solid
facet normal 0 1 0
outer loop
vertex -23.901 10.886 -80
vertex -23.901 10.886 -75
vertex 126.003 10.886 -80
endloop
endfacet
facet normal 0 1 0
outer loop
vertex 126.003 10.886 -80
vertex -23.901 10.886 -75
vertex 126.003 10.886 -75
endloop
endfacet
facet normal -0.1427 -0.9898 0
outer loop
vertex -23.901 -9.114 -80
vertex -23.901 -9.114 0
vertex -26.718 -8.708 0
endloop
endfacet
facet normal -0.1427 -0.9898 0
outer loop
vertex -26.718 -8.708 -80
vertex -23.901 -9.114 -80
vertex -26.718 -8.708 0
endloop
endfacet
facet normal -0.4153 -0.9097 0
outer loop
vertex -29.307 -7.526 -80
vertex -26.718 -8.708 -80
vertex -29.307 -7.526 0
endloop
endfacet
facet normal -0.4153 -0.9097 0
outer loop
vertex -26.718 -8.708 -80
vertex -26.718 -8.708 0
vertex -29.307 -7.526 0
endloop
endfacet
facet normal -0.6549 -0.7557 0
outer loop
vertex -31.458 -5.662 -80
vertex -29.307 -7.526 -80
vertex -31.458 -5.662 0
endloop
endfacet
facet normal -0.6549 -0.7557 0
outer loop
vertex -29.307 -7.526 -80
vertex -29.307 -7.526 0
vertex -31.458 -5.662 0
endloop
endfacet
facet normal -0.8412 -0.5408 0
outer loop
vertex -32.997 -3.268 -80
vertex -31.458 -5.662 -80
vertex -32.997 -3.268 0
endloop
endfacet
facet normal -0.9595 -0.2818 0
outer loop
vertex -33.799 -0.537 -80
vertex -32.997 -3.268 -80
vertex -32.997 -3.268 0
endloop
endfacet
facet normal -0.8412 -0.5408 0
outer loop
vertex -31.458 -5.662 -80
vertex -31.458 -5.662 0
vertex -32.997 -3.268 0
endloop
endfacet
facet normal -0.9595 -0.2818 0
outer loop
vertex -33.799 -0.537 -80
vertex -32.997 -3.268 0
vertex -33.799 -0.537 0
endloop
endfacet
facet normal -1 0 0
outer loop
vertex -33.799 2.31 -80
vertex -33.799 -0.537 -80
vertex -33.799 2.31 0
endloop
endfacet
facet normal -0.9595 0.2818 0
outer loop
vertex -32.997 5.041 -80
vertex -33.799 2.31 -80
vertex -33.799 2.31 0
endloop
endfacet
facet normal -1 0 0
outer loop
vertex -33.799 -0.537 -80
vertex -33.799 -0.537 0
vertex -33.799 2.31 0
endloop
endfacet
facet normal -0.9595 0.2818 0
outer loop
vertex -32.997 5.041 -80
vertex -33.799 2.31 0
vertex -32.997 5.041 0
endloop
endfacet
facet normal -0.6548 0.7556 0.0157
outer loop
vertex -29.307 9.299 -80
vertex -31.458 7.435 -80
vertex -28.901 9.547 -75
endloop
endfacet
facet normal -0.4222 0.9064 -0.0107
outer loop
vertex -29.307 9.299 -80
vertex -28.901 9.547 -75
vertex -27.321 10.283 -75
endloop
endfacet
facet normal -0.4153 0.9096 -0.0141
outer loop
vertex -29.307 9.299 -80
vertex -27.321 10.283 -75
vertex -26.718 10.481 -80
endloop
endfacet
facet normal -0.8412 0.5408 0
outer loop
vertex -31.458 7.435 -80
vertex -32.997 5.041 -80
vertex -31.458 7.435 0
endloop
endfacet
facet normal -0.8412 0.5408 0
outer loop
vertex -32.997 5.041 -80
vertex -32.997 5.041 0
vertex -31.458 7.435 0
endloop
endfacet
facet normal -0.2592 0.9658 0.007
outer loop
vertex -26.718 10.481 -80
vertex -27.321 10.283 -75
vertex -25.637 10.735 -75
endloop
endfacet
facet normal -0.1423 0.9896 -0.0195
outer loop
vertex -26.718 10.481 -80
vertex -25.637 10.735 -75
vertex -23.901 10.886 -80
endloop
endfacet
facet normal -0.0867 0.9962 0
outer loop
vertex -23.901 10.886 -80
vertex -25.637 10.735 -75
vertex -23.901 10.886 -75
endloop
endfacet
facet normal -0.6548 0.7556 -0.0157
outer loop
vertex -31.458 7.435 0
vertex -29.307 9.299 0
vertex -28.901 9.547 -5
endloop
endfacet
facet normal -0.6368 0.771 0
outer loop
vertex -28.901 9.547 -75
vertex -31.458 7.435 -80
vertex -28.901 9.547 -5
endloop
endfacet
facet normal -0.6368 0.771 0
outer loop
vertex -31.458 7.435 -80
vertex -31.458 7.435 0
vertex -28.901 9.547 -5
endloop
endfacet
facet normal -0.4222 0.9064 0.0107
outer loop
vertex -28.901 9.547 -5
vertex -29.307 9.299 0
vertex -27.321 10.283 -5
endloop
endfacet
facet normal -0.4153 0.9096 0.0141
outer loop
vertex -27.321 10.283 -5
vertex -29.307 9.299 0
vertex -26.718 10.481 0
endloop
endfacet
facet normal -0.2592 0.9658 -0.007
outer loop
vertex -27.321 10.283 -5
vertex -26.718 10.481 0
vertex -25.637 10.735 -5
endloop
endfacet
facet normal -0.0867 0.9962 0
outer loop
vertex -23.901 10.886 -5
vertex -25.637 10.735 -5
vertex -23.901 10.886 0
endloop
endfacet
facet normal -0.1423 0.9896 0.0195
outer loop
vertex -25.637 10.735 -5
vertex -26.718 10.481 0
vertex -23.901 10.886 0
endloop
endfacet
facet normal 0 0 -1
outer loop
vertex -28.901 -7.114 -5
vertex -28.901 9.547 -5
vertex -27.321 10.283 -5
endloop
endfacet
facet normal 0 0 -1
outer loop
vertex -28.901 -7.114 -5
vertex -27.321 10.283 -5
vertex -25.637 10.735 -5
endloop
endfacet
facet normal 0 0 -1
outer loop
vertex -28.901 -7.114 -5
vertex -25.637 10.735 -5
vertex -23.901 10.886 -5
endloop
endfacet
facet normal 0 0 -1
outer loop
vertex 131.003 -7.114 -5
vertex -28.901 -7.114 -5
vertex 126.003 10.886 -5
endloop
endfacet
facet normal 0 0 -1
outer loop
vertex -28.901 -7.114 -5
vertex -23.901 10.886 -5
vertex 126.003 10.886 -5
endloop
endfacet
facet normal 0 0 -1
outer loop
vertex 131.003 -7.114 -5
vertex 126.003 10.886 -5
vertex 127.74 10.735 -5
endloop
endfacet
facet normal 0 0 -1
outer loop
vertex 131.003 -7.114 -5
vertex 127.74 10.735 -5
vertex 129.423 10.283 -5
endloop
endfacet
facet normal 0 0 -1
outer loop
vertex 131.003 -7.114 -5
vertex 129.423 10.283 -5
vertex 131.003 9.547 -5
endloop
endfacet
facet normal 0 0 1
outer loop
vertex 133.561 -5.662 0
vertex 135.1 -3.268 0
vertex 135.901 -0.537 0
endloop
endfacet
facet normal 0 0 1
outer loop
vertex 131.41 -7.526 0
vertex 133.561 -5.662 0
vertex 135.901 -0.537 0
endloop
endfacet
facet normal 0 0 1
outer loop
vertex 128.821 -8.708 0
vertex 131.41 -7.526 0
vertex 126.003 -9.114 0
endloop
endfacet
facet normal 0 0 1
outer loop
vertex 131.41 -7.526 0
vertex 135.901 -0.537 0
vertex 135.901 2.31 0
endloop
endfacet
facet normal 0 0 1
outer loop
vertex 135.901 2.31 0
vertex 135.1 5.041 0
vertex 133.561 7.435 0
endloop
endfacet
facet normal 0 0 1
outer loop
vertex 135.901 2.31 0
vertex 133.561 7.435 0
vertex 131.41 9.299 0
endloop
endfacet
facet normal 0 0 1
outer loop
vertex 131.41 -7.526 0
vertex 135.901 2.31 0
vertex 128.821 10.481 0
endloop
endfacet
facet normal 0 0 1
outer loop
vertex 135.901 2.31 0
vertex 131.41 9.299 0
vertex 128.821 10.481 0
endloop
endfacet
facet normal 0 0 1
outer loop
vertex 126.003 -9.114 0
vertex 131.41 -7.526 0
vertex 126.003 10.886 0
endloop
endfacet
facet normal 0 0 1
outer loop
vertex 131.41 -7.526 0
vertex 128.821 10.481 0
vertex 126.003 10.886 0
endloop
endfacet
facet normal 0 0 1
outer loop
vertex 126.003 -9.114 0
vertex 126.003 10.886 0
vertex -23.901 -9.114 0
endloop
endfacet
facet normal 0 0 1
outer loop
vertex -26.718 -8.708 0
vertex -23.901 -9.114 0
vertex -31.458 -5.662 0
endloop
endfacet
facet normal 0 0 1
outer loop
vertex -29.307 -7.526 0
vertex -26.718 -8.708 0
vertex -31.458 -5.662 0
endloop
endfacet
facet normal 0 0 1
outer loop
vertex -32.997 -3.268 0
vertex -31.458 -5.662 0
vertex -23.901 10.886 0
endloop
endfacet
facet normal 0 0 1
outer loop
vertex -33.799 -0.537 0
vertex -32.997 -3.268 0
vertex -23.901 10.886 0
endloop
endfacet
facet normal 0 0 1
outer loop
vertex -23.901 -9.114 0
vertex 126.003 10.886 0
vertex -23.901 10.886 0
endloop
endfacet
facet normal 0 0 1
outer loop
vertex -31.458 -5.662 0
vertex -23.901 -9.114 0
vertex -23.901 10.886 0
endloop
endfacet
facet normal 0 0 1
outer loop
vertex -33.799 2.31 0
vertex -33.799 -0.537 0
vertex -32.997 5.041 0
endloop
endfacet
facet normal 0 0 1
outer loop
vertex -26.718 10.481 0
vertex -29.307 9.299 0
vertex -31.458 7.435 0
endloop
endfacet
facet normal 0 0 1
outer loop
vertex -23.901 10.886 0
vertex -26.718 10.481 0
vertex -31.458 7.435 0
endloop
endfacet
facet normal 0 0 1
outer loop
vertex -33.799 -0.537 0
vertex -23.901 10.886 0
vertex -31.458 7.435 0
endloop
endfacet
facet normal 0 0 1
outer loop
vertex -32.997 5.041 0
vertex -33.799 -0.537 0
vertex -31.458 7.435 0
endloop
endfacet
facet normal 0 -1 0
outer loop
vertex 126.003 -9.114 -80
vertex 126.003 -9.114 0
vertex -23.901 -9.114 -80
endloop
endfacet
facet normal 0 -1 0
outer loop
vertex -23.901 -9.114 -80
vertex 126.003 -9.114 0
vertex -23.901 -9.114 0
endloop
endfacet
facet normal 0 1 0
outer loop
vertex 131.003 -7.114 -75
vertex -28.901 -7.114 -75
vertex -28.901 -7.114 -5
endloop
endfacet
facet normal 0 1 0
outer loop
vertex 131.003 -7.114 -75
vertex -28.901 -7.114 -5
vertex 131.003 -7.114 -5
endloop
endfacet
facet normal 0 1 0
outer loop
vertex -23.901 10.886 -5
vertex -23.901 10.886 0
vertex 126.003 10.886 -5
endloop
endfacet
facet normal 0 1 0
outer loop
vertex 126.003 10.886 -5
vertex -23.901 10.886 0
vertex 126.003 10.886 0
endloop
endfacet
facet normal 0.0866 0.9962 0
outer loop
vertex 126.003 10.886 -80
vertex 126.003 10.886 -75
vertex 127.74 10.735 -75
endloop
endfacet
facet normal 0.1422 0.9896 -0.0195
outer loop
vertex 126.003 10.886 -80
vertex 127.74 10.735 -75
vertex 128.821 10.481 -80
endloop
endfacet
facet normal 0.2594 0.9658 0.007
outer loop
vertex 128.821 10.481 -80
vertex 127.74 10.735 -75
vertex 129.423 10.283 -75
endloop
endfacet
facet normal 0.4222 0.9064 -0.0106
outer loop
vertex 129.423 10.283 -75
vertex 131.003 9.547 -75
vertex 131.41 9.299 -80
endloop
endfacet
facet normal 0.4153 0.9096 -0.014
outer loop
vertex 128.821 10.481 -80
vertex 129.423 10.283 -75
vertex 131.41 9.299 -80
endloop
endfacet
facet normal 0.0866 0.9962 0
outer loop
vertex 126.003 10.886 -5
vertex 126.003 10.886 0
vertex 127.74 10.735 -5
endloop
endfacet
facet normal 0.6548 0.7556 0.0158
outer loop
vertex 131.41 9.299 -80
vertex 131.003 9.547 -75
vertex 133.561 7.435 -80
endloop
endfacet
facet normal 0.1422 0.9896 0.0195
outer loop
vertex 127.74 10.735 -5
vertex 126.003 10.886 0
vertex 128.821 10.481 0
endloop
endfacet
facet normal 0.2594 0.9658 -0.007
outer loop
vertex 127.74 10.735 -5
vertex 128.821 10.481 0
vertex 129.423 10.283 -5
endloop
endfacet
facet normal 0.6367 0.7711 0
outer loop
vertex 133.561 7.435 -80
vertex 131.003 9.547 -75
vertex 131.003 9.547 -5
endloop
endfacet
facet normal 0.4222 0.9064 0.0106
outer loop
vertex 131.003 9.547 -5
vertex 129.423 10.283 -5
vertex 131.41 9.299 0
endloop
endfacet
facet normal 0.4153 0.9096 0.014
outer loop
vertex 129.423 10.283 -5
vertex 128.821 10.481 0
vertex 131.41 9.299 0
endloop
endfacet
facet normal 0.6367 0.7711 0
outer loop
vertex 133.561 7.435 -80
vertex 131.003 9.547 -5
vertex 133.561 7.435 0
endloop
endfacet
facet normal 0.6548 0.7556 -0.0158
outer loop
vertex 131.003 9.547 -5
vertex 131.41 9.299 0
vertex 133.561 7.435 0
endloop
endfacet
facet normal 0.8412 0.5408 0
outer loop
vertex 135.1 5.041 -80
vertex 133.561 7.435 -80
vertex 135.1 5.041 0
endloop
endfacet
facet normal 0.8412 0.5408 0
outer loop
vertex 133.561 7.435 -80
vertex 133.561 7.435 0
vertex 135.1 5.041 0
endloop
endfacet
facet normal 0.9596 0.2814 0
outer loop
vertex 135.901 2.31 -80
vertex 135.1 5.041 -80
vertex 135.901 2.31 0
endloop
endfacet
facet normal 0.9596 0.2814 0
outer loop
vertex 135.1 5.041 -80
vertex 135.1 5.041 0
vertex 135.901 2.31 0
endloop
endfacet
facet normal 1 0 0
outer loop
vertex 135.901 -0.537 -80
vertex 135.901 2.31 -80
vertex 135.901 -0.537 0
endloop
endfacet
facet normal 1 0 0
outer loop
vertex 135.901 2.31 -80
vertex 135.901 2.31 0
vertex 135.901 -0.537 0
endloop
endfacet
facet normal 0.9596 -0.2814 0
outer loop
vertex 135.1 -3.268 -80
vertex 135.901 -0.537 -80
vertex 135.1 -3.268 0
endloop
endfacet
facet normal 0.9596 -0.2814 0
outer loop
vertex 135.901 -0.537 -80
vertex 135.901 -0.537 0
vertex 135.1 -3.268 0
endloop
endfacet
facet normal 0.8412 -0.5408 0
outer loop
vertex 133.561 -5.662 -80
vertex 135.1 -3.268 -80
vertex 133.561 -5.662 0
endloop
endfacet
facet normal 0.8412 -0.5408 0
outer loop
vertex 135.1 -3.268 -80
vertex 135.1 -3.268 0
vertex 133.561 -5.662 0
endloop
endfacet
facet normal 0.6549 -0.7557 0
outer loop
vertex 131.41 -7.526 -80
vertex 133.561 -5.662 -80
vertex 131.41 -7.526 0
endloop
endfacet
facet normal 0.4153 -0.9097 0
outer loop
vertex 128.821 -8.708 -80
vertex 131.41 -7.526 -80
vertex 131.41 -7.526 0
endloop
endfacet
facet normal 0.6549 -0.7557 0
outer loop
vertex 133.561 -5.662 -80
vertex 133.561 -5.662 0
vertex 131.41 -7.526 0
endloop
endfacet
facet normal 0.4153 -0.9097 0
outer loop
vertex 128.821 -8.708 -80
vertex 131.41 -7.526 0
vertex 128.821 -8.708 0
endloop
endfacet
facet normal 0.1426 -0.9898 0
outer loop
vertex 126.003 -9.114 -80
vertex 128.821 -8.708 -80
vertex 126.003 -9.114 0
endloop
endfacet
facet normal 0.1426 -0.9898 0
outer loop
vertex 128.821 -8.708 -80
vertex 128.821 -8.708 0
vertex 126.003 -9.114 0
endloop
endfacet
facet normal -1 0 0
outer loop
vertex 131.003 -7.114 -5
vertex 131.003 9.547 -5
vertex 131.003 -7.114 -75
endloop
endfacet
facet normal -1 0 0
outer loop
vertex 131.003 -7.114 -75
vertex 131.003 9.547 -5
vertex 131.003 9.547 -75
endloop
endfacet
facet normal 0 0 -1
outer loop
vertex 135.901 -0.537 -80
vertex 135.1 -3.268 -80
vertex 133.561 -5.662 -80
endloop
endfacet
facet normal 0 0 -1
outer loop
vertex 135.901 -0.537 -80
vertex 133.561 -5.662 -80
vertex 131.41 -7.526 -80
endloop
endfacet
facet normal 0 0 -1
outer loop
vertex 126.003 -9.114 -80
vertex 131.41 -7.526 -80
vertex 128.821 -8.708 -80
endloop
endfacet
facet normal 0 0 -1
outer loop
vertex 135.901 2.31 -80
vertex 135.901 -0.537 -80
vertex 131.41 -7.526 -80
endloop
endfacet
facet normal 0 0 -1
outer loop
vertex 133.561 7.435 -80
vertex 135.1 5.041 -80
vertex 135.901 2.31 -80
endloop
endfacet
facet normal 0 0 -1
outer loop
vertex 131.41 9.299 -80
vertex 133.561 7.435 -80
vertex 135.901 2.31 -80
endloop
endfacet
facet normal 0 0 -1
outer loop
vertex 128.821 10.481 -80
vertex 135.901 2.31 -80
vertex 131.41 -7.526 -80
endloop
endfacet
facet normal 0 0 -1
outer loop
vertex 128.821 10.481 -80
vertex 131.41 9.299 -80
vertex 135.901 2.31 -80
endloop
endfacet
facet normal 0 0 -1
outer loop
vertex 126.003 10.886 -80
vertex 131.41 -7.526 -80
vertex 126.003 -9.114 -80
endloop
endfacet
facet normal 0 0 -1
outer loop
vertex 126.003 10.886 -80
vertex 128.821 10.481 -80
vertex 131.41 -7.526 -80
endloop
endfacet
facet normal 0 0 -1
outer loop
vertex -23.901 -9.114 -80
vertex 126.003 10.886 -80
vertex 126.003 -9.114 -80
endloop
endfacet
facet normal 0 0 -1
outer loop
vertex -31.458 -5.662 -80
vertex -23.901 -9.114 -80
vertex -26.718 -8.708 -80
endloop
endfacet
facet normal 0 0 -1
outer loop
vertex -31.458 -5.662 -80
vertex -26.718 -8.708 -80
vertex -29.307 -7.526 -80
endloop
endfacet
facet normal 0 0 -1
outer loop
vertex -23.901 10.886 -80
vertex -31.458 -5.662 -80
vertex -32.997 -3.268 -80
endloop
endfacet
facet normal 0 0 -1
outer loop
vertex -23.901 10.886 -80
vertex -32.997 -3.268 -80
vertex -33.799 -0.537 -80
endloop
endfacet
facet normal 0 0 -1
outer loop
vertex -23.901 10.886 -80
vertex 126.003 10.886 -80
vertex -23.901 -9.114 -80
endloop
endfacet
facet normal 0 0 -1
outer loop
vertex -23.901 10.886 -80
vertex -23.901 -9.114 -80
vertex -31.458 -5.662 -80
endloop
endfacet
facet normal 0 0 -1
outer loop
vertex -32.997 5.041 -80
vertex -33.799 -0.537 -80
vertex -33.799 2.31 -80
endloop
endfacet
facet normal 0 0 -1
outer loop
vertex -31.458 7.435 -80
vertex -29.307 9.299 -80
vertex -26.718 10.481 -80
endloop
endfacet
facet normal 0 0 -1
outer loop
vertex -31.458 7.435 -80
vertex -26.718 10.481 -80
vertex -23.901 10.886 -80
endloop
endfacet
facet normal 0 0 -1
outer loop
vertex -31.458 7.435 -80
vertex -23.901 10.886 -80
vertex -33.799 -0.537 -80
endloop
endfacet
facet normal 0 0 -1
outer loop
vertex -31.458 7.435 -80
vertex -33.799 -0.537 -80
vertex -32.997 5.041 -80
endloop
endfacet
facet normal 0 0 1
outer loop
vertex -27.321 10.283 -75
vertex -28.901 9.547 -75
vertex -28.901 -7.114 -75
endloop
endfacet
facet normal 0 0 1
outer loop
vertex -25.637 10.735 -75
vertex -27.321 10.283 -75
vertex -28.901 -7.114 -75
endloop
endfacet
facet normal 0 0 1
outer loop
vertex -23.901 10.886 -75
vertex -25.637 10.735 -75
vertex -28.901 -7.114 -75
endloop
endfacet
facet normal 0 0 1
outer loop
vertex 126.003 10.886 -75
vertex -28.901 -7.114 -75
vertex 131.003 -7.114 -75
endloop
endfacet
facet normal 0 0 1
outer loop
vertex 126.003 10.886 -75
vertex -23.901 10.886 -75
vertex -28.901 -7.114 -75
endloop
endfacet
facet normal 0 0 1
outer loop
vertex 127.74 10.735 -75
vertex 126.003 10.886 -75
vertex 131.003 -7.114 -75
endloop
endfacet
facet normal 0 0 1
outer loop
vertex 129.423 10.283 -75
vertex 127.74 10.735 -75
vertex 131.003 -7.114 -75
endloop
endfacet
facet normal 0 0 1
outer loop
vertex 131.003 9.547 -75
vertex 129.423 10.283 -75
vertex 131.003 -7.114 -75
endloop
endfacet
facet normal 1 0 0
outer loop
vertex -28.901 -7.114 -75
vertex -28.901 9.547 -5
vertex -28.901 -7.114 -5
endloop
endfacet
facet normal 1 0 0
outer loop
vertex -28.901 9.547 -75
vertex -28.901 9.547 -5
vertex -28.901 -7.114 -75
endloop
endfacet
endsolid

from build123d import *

# Parameters (mm, degrees)
BOSS_EXTRUDE1_DEPTH = 80
SKETCH2_W           = 159.903810567
SKETCH2_H           = 70
CUT_EXTRUDE1_DEPTH  = 18


with BuildPart() as part:
    # Sketch1 → Boss-Extrude1 (new body)
    with BuildSketch(Plane.XY):
        with BuildLine():
            Line((-3.900533574, 10.886474949), (126.003276993, 10.886474949))
            ThreePointArc((126.003276993, 10.886474949), (136.003276993, 0.886474949), (126.003276993, -9.113525051))
            Line((126.003276993, -9.113525051), (-3.900533574, -9.113525051))
            Line((-3.900533574, -9.113525051), (-23.900533574, -9.113525051))
            ThreePointArc((-23.900533574, -9.113525051), (-33.900533574, 0.886474949), (-23.900533574, 10.886474949))
            Line((-23.900533574, 10.886474949), (-3.900533574, 10.886474949))
        make_face()
    extrude(amount=-BOSS_EXTRUDE1_DEPTH)

    # Sketch2 → Cut-Extrude1 (cut)
    with BuildSketch(Plane(origin=(0, 10.886474949, 0), x_dir=(1, 0, 0), z_dir=(0, 1, 0))):
        with Locations((51.05137171, 40)):
            Rectangle(SKETCH2_W, SKETCH2_H)
    extrude(amount=-CUT_EXTRUDE1_DEPTH, mode=Mode.SUBTRACT)


solid = part.part
